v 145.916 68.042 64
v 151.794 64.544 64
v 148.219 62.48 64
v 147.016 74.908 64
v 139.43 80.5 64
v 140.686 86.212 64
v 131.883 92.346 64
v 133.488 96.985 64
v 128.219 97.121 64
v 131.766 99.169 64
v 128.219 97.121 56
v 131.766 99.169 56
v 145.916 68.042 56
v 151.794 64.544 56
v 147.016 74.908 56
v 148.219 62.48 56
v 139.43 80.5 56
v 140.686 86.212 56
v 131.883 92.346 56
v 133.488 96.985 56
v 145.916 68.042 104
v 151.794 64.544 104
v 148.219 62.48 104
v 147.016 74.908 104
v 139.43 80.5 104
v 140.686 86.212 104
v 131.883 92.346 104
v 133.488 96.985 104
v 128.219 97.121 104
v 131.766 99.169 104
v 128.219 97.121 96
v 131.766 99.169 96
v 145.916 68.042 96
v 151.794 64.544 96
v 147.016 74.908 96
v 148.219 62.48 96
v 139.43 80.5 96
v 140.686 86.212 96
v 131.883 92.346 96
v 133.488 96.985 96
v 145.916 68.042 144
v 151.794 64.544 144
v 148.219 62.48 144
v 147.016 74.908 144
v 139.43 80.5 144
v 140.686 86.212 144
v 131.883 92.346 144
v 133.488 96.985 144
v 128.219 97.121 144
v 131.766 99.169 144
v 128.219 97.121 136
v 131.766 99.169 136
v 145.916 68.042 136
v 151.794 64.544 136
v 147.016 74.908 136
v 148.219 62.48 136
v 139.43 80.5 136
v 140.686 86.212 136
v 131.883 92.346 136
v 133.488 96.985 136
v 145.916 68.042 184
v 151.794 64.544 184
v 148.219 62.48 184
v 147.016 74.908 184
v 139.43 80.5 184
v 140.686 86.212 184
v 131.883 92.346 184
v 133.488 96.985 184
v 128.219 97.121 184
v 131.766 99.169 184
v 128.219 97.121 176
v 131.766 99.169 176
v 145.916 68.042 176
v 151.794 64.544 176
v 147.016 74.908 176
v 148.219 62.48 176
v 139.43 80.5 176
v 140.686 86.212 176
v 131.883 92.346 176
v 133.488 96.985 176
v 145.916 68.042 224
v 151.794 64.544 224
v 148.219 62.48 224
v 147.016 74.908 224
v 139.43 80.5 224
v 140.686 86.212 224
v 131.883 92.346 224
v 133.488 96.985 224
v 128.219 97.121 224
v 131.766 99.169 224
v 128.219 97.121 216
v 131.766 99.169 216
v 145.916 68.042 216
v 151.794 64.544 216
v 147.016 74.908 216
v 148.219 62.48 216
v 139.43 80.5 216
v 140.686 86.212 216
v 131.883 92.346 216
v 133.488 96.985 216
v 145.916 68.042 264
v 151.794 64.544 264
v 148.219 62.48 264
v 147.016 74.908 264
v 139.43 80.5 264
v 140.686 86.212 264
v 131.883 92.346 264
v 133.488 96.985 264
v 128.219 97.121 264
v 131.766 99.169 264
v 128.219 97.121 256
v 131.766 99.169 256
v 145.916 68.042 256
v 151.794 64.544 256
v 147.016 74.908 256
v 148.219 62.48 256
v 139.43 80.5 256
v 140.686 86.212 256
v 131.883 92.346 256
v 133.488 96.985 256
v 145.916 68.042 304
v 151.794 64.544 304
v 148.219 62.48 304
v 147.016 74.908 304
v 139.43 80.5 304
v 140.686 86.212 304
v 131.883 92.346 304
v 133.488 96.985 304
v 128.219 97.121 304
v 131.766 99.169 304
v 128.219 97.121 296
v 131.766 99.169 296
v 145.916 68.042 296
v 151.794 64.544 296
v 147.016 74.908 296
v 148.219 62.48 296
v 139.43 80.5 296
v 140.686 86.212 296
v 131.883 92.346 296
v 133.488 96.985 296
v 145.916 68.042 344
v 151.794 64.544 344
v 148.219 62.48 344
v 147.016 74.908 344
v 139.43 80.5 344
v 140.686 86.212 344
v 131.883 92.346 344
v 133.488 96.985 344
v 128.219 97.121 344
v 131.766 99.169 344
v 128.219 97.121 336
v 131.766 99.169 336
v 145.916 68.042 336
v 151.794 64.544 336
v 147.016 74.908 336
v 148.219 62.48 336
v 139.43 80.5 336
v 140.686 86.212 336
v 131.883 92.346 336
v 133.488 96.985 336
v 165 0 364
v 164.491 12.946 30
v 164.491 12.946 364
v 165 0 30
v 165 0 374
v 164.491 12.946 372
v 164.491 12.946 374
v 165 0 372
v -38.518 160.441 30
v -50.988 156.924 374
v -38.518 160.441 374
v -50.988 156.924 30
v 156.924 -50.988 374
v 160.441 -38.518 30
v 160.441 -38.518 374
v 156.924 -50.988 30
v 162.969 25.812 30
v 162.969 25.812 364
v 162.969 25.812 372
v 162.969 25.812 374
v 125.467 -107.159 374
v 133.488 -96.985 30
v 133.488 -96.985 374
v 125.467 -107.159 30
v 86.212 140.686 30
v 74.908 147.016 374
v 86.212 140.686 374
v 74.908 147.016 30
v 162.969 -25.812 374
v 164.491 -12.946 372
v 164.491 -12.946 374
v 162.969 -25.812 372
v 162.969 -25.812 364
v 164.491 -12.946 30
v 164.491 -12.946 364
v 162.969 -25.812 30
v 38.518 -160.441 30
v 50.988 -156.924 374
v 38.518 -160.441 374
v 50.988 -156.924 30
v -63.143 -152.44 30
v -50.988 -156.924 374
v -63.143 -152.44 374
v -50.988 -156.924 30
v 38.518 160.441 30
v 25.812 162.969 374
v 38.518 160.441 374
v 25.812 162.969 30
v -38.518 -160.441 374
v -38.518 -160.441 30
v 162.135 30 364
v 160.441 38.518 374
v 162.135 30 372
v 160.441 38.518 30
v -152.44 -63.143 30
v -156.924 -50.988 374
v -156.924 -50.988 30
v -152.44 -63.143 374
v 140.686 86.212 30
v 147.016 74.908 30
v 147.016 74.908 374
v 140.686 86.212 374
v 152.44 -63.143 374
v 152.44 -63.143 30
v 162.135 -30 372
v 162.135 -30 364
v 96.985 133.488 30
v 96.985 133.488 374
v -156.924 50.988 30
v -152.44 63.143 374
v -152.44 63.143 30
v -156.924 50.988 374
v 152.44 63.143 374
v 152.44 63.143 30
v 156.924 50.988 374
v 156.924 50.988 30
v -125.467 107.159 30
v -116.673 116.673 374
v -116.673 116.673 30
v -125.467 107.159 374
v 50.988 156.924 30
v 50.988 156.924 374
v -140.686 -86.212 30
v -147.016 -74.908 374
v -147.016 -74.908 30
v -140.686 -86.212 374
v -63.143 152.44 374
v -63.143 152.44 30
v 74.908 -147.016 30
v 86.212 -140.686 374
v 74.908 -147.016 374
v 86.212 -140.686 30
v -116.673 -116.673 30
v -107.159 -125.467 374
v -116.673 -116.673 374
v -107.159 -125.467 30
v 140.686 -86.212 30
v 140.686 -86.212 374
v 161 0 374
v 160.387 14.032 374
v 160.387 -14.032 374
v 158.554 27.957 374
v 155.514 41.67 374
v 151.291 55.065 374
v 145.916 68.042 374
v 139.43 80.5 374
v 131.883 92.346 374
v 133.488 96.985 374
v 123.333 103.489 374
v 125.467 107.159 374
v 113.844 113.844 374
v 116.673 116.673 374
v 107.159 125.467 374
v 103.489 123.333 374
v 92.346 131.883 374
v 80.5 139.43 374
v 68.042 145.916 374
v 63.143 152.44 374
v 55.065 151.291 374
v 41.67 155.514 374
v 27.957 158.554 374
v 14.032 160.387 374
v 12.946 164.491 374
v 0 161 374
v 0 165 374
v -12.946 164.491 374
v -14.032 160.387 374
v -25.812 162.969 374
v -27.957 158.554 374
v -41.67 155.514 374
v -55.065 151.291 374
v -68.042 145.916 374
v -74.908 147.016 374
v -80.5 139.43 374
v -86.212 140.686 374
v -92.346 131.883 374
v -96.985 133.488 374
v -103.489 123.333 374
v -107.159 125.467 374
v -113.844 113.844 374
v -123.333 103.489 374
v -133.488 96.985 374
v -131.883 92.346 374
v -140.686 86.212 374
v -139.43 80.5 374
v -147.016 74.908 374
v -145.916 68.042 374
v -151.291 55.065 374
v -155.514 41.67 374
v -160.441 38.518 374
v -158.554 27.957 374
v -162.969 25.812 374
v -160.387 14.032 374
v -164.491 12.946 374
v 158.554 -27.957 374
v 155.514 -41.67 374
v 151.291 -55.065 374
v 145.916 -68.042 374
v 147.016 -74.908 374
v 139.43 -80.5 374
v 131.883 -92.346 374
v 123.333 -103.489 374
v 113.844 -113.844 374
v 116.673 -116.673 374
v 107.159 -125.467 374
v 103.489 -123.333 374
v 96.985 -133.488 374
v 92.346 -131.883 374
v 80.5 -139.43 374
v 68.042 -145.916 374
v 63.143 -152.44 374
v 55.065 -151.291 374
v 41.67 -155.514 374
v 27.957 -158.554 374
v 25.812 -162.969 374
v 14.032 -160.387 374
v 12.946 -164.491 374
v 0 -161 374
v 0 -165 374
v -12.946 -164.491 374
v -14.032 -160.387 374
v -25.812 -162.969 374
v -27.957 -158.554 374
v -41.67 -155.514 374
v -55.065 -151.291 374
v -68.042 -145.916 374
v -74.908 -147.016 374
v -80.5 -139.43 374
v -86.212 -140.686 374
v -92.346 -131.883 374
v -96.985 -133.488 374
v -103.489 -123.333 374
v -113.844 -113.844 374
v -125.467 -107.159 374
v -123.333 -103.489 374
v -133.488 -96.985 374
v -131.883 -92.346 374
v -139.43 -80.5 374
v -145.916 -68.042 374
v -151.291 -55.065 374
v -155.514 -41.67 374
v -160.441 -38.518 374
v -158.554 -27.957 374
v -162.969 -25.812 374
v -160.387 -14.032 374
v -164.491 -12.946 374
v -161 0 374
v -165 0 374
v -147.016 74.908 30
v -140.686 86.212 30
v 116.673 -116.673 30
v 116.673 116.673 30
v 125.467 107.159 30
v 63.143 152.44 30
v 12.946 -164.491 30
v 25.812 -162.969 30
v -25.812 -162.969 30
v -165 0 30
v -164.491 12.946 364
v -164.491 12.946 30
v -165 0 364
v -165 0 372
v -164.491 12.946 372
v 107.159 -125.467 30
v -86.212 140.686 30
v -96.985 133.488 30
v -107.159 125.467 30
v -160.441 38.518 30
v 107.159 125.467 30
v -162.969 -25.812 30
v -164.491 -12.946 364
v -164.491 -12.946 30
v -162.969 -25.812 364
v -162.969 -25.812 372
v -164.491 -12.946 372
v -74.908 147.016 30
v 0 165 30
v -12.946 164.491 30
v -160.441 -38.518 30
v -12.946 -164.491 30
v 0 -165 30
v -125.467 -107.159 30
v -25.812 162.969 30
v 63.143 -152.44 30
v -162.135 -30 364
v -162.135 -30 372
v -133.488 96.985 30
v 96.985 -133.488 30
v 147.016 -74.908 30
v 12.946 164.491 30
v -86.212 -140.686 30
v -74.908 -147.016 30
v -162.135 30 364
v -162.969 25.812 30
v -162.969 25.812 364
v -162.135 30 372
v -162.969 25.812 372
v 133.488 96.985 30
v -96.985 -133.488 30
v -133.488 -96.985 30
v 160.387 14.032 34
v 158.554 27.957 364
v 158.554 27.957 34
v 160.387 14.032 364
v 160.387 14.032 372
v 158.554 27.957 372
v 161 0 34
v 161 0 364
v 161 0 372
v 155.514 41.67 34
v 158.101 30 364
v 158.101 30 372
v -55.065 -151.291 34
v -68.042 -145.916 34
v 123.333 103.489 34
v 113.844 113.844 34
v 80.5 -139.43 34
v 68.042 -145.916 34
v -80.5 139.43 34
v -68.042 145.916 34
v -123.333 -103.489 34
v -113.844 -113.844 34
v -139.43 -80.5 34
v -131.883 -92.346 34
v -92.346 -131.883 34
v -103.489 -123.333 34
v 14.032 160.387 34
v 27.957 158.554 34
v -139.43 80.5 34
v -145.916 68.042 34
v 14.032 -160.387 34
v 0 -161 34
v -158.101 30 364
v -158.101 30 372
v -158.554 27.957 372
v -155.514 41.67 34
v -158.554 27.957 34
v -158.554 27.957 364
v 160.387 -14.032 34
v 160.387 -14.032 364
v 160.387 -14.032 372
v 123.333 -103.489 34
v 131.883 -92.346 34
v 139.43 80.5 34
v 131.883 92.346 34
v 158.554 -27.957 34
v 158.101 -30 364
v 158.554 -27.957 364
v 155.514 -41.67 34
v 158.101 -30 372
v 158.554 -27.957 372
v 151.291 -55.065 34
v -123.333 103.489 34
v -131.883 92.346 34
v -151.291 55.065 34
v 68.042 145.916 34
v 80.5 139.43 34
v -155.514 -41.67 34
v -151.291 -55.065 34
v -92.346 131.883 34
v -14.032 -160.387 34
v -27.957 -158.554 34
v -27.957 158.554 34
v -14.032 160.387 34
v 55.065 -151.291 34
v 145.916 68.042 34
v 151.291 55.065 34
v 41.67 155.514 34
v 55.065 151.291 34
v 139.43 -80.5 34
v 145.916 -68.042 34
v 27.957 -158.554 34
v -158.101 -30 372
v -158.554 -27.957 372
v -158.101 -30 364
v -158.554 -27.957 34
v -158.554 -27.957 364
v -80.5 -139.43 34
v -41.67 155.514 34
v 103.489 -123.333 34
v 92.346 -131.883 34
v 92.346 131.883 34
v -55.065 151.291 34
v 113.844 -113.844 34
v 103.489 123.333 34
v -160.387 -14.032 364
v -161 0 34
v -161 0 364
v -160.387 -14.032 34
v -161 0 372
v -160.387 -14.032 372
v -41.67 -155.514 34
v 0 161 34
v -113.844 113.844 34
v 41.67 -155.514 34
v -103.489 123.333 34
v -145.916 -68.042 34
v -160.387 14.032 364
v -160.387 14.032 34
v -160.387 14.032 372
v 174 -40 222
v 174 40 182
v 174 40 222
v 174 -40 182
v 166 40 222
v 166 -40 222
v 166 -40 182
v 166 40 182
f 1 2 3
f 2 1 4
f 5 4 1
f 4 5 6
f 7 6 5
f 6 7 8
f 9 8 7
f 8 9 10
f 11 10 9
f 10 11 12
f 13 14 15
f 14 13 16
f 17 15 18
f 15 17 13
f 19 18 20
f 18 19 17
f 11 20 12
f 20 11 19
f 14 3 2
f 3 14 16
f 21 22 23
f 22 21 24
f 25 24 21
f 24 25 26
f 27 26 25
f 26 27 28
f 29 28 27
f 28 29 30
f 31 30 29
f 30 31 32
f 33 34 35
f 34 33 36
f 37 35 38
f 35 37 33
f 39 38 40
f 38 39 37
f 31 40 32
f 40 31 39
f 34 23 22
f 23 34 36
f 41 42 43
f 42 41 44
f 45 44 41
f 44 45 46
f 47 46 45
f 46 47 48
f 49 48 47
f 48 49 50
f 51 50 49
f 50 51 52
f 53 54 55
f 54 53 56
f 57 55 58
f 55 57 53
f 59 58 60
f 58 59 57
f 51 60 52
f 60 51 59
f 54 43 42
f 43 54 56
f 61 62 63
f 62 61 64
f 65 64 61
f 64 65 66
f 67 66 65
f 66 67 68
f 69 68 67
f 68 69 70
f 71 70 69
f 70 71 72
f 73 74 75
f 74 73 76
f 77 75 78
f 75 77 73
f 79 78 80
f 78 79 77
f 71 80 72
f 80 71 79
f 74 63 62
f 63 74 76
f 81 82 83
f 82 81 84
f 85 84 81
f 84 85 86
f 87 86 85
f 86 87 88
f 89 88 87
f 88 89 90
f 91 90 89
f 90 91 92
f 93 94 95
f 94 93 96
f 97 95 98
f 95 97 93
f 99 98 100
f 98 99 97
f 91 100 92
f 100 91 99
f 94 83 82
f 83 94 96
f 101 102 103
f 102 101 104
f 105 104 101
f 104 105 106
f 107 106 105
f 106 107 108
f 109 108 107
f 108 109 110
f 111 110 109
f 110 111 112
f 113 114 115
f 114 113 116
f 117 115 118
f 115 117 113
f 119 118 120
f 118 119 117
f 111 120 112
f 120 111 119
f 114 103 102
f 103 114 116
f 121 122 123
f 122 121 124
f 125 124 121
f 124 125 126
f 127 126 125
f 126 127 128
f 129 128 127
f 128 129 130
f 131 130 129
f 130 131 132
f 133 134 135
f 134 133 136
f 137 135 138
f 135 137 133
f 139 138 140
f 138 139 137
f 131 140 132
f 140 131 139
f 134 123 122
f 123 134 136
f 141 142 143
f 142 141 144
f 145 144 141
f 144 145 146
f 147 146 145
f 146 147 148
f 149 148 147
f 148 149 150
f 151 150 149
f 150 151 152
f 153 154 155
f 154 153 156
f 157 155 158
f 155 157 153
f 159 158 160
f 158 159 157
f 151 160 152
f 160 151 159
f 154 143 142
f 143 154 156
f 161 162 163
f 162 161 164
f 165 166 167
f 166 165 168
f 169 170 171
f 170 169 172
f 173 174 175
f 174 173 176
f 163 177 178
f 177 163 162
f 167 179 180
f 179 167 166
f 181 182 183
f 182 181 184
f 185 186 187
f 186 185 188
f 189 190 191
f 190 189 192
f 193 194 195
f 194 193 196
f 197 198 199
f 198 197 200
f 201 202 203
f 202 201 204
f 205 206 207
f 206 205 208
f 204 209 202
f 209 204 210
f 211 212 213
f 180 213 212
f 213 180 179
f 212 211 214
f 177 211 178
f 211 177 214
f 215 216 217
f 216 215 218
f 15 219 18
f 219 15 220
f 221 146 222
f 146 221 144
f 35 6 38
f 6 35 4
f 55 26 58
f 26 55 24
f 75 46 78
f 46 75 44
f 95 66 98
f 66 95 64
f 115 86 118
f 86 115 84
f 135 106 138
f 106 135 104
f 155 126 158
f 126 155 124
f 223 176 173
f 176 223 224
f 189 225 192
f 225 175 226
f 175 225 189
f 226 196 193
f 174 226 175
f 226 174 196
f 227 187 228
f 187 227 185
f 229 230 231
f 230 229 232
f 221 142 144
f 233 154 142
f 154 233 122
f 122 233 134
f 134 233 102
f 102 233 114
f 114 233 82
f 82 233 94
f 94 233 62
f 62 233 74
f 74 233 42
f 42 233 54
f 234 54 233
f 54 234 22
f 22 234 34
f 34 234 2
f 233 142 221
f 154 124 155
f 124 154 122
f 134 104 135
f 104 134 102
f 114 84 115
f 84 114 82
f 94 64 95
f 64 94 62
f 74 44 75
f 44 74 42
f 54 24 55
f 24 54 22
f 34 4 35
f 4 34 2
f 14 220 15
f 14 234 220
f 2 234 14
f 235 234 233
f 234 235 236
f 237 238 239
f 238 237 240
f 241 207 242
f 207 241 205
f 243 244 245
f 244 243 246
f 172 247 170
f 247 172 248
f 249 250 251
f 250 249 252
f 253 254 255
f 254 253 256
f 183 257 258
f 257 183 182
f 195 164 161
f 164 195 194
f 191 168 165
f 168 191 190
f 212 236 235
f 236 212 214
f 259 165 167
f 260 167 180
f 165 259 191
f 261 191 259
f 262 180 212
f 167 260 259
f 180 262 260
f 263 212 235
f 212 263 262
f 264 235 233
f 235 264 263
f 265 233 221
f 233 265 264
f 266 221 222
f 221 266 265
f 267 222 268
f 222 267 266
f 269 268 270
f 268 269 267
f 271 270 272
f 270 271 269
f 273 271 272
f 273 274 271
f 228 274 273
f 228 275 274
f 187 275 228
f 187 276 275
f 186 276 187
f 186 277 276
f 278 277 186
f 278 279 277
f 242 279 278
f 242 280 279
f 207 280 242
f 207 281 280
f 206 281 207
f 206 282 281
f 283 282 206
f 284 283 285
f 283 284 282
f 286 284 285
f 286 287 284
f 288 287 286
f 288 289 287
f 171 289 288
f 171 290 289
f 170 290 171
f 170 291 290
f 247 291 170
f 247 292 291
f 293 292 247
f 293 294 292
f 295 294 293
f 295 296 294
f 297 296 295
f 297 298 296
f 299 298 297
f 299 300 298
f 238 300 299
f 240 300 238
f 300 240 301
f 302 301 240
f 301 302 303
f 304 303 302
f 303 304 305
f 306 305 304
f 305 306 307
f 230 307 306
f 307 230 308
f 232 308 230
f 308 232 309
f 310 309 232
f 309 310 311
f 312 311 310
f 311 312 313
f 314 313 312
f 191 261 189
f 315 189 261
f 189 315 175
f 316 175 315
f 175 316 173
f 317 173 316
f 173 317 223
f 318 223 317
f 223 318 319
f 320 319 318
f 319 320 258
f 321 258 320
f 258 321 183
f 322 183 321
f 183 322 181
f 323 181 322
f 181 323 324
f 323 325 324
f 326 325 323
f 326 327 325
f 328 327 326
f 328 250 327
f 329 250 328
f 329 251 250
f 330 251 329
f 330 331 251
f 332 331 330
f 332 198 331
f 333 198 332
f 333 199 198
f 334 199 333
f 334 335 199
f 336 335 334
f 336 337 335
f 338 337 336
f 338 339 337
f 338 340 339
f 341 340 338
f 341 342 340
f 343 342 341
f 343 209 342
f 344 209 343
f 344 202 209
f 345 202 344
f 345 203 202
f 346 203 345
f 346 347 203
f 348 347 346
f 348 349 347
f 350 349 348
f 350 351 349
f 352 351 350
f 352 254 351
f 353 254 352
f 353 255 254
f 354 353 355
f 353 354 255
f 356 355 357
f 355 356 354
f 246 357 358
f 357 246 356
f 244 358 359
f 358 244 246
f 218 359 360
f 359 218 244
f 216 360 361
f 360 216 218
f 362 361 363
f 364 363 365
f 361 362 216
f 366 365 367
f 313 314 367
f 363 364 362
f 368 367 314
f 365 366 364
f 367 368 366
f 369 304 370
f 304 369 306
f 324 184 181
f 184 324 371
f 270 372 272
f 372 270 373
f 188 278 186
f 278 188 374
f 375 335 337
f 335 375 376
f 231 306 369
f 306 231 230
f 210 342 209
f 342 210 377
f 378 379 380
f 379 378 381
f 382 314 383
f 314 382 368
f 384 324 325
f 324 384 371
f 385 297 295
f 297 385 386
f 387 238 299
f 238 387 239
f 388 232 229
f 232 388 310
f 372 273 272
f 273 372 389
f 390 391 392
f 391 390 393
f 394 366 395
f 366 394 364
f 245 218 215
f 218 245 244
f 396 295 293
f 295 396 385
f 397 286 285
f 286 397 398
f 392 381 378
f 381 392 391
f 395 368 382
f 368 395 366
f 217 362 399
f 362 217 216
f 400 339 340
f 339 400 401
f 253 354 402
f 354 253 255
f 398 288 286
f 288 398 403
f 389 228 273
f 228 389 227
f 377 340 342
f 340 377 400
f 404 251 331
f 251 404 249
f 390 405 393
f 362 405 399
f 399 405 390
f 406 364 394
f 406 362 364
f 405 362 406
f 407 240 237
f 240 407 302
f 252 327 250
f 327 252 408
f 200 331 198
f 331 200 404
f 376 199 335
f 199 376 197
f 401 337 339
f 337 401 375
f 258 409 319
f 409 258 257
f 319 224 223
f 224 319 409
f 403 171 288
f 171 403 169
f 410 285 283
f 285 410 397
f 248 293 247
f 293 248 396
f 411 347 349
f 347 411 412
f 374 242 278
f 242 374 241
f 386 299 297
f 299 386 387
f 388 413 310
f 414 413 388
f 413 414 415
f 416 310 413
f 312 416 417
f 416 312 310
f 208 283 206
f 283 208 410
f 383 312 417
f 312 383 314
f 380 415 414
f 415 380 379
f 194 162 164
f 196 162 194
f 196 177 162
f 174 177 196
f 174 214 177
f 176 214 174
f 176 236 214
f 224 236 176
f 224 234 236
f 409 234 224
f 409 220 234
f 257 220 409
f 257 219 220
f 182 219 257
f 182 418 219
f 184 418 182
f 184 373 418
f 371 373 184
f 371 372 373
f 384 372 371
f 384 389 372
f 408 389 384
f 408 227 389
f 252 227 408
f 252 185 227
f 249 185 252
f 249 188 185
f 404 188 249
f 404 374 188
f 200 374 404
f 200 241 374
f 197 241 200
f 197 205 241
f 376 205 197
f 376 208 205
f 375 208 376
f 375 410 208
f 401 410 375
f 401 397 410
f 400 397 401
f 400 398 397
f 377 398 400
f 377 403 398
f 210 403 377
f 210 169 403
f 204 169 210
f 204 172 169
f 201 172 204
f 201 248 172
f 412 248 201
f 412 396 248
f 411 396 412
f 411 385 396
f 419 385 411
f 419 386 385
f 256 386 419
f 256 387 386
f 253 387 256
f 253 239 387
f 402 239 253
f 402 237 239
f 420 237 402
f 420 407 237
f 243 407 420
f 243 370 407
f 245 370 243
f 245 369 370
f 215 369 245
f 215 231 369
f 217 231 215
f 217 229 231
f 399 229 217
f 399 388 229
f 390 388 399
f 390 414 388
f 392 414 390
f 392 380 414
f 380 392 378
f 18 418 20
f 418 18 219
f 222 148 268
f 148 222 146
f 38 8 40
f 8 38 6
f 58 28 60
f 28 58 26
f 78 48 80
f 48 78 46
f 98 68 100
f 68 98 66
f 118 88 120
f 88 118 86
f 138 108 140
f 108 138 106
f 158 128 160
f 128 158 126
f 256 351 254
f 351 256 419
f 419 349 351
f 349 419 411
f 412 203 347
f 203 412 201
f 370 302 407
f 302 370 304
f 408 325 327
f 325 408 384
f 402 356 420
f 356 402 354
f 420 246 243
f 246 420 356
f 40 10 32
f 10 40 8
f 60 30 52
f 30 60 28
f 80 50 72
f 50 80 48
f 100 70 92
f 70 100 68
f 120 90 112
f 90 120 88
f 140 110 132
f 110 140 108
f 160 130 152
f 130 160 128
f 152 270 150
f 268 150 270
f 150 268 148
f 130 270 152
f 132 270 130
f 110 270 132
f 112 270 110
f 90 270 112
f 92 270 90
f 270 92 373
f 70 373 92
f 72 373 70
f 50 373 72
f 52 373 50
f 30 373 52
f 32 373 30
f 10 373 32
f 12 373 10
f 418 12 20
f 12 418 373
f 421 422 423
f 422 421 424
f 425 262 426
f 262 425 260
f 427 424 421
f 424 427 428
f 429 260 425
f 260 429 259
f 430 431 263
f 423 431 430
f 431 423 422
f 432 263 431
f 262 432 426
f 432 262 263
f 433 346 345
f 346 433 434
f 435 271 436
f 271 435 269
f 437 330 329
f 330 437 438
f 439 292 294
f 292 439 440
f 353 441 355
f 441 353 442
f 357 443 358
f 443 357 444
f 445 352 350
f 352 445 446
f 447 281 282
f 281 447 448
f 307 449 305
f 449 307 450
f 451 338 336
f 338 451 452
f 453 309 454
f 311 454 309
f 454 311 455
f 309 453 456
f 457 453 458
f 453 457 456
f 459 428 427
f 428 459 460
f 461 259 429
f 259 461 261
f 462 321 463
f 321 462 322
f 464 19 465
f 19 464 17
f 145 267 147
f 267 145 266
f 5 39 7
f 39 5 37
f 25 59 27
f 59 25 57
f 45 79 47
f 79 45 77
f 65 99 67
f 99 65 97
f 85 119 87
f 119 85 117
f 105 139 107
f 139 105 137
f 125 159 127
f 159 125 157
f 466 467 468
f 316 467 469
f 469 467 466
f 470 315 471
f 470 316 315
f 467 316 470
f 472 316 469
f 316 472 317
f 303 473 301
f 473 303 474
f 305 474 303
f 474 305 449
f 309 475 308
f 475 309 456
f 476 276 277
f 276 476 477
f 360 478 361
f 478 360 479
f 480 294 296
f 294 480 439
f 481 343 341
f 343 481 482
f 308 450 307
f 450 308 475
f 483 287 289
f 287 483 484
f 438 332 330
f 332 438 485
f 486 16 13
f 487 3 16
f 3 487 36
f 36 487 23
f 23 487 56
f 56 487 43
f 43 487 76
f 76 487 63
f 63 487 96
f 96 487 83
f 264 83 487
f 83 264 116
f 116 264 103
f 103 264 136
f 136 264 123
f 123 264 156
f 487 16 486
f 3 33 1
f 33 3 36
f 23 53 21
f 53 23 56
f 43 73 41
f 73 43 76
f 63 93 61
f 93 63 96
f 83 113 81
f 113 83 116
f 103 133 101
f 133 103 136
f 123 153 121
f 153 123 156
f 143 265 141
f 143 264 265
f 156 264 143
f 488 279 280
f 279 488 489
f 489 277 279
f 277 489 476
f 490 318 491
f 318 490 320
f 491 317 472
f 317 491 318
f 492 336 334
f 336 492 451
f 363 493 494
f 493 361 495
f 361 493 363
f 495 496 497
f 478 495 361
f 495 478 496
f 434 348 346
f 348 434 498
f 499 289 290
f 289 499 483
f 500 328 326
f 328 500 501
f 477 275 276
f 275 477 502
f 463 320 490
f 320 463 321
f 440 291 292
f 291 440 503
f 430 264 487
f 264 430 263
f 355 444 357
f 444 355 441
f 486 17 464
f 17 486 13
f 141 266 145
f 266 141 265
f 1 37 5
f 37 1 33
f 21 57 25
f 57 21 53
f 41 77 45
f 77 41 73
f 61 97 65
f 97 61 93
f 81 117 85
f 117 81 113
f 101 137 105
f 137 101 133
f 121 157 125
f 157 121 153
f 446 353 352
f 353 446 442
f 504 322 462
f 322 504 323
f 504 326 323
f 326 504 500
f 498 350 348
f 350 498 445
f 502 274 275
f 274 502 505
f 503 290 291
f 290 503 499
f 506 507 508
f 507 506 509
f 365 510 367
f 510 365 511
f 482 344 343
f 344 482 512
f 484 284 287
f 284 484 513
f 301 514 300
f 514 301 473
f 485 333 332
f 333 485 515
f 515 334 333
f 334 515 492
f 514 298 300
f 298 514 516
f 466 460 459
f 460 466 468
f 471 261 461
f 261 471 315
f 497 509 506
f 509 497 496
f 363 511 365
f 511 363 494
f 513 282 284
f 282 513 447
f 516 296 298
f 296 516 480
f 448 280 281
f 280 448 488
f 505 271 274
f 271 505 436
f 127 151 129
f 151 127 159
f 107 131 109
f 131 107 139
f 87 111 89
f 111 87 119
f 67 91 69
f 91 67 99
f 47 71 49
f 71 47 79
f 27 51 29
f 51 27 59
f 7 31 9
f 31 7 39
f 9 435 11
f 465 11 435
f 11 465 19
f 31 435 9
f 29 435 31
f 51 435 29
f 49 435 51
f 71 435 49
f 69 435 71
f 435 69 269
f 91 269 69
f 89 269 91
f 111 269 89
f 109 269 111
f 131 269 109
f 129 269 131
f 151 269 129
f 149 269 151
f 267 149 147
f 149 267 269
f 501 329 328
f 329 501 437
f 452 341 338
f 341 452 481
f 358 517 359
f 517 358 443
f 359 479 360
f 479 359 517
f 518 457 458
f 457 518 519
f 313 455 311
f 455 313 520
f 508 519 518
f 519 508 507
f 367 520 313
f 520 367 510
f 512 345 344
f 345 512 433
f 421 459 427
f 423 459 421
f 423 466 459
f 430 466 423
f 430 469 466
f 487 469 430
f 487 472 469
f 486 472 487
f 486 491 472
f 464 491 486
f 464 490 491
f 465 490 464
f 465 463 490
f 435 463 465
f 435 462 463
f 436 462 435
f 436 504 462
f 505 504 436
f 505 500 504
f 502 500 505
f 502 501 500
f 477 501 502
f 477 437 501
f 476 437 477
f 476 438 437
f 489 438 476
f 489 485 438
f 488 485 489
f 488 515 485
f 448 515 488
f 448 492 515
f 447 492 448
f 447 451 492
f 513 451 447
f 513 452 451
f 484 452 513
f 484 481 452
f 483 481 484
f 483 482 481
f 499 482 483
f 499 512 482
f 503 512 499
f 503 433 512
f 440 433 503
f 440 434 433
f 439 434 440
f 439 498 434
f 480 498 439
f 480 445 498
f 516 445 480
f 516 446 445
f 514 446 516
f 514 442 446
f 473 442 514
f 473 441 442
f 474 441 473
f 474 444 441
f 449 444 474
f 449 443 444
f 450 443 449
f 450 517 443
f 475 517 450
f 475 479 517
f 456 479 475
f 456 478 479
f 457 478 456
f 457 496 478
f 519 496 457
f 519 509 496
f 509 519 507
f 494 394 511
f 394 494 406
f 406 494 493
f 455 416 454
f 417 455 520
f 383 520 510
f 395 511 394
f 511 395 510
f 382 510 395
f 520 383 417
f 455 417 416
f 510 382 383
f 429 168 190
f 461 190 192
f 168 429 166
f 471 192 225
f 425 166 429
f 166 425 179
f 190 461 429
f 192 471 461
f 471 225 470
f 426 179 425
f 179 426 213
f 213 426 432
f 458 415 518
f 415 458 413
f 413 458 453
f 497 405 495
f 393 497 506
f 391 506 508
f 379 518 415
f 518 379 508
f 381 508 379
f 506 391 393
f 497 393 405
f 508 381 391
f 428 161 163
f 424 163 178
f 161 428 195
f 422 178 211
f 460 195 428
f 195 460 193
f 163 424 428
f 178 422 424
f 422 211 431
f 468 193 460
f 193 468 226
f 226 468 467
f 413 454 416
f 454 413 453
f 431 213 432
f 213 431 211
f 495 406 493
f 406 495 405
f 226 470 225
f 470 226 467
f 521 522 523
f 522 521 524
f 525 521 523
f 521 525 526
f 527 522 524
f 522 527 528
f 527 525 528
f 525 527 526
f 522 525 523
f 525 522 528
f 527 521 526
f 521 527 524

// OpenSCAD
// file: lib/generated_constants.scad
// AUTO-GENERATED from simulation/sizing.py — do not hand edit
P_target_W = 10.0;
A_mem_m2 = 0.72;
active_w = 200.0;
active_h = 300.0;
n_plates = 12;
housing_od = 280.0;
housing_len = 264;
bolt_circle = 240.0;
frame_L = 664;
frame_W = 480.0;
frame_H = 900;
delta_P_bar = 34.58;
plate_pitch = 12;
// main file
// CHORUS — thermal / moist coupling plenum (wraps PRO housing)
include <lib/generated_constants.scad>

module chorus_enclosure() {
  plenum_gap = 25;
  wall = 4;
  len = housing_len + 80;
  od = housing_od + 2*plenum_gap;
  difference() {
    translate([0, 0, 30])
      cylinder(h=len, d=od, $fn=80);
    translate([0, 0, 30+wall])
      cylinder(h=len, d=od-2*wall, $fn=72);
    // humidity inlet louvers
    for (z = [60:40:len]) {
      rotate([0, 0, 30])
        translate([od/2-2, 0, z])
          cube([10, 40, 8], center=true);
    }
    // PV/moist panel mount rail (top)
    translate([-od/2, -30, len+20])
      cube([od, 60, 8]);
  }
  // sensor gland plate
  translate([od/2+5, 0, len/2+30])
    cube([8, 80, 40], center=true);
}

module chorus_enclosure_part() { chorus_enclosure(); }
chorus_enclosure_part();
